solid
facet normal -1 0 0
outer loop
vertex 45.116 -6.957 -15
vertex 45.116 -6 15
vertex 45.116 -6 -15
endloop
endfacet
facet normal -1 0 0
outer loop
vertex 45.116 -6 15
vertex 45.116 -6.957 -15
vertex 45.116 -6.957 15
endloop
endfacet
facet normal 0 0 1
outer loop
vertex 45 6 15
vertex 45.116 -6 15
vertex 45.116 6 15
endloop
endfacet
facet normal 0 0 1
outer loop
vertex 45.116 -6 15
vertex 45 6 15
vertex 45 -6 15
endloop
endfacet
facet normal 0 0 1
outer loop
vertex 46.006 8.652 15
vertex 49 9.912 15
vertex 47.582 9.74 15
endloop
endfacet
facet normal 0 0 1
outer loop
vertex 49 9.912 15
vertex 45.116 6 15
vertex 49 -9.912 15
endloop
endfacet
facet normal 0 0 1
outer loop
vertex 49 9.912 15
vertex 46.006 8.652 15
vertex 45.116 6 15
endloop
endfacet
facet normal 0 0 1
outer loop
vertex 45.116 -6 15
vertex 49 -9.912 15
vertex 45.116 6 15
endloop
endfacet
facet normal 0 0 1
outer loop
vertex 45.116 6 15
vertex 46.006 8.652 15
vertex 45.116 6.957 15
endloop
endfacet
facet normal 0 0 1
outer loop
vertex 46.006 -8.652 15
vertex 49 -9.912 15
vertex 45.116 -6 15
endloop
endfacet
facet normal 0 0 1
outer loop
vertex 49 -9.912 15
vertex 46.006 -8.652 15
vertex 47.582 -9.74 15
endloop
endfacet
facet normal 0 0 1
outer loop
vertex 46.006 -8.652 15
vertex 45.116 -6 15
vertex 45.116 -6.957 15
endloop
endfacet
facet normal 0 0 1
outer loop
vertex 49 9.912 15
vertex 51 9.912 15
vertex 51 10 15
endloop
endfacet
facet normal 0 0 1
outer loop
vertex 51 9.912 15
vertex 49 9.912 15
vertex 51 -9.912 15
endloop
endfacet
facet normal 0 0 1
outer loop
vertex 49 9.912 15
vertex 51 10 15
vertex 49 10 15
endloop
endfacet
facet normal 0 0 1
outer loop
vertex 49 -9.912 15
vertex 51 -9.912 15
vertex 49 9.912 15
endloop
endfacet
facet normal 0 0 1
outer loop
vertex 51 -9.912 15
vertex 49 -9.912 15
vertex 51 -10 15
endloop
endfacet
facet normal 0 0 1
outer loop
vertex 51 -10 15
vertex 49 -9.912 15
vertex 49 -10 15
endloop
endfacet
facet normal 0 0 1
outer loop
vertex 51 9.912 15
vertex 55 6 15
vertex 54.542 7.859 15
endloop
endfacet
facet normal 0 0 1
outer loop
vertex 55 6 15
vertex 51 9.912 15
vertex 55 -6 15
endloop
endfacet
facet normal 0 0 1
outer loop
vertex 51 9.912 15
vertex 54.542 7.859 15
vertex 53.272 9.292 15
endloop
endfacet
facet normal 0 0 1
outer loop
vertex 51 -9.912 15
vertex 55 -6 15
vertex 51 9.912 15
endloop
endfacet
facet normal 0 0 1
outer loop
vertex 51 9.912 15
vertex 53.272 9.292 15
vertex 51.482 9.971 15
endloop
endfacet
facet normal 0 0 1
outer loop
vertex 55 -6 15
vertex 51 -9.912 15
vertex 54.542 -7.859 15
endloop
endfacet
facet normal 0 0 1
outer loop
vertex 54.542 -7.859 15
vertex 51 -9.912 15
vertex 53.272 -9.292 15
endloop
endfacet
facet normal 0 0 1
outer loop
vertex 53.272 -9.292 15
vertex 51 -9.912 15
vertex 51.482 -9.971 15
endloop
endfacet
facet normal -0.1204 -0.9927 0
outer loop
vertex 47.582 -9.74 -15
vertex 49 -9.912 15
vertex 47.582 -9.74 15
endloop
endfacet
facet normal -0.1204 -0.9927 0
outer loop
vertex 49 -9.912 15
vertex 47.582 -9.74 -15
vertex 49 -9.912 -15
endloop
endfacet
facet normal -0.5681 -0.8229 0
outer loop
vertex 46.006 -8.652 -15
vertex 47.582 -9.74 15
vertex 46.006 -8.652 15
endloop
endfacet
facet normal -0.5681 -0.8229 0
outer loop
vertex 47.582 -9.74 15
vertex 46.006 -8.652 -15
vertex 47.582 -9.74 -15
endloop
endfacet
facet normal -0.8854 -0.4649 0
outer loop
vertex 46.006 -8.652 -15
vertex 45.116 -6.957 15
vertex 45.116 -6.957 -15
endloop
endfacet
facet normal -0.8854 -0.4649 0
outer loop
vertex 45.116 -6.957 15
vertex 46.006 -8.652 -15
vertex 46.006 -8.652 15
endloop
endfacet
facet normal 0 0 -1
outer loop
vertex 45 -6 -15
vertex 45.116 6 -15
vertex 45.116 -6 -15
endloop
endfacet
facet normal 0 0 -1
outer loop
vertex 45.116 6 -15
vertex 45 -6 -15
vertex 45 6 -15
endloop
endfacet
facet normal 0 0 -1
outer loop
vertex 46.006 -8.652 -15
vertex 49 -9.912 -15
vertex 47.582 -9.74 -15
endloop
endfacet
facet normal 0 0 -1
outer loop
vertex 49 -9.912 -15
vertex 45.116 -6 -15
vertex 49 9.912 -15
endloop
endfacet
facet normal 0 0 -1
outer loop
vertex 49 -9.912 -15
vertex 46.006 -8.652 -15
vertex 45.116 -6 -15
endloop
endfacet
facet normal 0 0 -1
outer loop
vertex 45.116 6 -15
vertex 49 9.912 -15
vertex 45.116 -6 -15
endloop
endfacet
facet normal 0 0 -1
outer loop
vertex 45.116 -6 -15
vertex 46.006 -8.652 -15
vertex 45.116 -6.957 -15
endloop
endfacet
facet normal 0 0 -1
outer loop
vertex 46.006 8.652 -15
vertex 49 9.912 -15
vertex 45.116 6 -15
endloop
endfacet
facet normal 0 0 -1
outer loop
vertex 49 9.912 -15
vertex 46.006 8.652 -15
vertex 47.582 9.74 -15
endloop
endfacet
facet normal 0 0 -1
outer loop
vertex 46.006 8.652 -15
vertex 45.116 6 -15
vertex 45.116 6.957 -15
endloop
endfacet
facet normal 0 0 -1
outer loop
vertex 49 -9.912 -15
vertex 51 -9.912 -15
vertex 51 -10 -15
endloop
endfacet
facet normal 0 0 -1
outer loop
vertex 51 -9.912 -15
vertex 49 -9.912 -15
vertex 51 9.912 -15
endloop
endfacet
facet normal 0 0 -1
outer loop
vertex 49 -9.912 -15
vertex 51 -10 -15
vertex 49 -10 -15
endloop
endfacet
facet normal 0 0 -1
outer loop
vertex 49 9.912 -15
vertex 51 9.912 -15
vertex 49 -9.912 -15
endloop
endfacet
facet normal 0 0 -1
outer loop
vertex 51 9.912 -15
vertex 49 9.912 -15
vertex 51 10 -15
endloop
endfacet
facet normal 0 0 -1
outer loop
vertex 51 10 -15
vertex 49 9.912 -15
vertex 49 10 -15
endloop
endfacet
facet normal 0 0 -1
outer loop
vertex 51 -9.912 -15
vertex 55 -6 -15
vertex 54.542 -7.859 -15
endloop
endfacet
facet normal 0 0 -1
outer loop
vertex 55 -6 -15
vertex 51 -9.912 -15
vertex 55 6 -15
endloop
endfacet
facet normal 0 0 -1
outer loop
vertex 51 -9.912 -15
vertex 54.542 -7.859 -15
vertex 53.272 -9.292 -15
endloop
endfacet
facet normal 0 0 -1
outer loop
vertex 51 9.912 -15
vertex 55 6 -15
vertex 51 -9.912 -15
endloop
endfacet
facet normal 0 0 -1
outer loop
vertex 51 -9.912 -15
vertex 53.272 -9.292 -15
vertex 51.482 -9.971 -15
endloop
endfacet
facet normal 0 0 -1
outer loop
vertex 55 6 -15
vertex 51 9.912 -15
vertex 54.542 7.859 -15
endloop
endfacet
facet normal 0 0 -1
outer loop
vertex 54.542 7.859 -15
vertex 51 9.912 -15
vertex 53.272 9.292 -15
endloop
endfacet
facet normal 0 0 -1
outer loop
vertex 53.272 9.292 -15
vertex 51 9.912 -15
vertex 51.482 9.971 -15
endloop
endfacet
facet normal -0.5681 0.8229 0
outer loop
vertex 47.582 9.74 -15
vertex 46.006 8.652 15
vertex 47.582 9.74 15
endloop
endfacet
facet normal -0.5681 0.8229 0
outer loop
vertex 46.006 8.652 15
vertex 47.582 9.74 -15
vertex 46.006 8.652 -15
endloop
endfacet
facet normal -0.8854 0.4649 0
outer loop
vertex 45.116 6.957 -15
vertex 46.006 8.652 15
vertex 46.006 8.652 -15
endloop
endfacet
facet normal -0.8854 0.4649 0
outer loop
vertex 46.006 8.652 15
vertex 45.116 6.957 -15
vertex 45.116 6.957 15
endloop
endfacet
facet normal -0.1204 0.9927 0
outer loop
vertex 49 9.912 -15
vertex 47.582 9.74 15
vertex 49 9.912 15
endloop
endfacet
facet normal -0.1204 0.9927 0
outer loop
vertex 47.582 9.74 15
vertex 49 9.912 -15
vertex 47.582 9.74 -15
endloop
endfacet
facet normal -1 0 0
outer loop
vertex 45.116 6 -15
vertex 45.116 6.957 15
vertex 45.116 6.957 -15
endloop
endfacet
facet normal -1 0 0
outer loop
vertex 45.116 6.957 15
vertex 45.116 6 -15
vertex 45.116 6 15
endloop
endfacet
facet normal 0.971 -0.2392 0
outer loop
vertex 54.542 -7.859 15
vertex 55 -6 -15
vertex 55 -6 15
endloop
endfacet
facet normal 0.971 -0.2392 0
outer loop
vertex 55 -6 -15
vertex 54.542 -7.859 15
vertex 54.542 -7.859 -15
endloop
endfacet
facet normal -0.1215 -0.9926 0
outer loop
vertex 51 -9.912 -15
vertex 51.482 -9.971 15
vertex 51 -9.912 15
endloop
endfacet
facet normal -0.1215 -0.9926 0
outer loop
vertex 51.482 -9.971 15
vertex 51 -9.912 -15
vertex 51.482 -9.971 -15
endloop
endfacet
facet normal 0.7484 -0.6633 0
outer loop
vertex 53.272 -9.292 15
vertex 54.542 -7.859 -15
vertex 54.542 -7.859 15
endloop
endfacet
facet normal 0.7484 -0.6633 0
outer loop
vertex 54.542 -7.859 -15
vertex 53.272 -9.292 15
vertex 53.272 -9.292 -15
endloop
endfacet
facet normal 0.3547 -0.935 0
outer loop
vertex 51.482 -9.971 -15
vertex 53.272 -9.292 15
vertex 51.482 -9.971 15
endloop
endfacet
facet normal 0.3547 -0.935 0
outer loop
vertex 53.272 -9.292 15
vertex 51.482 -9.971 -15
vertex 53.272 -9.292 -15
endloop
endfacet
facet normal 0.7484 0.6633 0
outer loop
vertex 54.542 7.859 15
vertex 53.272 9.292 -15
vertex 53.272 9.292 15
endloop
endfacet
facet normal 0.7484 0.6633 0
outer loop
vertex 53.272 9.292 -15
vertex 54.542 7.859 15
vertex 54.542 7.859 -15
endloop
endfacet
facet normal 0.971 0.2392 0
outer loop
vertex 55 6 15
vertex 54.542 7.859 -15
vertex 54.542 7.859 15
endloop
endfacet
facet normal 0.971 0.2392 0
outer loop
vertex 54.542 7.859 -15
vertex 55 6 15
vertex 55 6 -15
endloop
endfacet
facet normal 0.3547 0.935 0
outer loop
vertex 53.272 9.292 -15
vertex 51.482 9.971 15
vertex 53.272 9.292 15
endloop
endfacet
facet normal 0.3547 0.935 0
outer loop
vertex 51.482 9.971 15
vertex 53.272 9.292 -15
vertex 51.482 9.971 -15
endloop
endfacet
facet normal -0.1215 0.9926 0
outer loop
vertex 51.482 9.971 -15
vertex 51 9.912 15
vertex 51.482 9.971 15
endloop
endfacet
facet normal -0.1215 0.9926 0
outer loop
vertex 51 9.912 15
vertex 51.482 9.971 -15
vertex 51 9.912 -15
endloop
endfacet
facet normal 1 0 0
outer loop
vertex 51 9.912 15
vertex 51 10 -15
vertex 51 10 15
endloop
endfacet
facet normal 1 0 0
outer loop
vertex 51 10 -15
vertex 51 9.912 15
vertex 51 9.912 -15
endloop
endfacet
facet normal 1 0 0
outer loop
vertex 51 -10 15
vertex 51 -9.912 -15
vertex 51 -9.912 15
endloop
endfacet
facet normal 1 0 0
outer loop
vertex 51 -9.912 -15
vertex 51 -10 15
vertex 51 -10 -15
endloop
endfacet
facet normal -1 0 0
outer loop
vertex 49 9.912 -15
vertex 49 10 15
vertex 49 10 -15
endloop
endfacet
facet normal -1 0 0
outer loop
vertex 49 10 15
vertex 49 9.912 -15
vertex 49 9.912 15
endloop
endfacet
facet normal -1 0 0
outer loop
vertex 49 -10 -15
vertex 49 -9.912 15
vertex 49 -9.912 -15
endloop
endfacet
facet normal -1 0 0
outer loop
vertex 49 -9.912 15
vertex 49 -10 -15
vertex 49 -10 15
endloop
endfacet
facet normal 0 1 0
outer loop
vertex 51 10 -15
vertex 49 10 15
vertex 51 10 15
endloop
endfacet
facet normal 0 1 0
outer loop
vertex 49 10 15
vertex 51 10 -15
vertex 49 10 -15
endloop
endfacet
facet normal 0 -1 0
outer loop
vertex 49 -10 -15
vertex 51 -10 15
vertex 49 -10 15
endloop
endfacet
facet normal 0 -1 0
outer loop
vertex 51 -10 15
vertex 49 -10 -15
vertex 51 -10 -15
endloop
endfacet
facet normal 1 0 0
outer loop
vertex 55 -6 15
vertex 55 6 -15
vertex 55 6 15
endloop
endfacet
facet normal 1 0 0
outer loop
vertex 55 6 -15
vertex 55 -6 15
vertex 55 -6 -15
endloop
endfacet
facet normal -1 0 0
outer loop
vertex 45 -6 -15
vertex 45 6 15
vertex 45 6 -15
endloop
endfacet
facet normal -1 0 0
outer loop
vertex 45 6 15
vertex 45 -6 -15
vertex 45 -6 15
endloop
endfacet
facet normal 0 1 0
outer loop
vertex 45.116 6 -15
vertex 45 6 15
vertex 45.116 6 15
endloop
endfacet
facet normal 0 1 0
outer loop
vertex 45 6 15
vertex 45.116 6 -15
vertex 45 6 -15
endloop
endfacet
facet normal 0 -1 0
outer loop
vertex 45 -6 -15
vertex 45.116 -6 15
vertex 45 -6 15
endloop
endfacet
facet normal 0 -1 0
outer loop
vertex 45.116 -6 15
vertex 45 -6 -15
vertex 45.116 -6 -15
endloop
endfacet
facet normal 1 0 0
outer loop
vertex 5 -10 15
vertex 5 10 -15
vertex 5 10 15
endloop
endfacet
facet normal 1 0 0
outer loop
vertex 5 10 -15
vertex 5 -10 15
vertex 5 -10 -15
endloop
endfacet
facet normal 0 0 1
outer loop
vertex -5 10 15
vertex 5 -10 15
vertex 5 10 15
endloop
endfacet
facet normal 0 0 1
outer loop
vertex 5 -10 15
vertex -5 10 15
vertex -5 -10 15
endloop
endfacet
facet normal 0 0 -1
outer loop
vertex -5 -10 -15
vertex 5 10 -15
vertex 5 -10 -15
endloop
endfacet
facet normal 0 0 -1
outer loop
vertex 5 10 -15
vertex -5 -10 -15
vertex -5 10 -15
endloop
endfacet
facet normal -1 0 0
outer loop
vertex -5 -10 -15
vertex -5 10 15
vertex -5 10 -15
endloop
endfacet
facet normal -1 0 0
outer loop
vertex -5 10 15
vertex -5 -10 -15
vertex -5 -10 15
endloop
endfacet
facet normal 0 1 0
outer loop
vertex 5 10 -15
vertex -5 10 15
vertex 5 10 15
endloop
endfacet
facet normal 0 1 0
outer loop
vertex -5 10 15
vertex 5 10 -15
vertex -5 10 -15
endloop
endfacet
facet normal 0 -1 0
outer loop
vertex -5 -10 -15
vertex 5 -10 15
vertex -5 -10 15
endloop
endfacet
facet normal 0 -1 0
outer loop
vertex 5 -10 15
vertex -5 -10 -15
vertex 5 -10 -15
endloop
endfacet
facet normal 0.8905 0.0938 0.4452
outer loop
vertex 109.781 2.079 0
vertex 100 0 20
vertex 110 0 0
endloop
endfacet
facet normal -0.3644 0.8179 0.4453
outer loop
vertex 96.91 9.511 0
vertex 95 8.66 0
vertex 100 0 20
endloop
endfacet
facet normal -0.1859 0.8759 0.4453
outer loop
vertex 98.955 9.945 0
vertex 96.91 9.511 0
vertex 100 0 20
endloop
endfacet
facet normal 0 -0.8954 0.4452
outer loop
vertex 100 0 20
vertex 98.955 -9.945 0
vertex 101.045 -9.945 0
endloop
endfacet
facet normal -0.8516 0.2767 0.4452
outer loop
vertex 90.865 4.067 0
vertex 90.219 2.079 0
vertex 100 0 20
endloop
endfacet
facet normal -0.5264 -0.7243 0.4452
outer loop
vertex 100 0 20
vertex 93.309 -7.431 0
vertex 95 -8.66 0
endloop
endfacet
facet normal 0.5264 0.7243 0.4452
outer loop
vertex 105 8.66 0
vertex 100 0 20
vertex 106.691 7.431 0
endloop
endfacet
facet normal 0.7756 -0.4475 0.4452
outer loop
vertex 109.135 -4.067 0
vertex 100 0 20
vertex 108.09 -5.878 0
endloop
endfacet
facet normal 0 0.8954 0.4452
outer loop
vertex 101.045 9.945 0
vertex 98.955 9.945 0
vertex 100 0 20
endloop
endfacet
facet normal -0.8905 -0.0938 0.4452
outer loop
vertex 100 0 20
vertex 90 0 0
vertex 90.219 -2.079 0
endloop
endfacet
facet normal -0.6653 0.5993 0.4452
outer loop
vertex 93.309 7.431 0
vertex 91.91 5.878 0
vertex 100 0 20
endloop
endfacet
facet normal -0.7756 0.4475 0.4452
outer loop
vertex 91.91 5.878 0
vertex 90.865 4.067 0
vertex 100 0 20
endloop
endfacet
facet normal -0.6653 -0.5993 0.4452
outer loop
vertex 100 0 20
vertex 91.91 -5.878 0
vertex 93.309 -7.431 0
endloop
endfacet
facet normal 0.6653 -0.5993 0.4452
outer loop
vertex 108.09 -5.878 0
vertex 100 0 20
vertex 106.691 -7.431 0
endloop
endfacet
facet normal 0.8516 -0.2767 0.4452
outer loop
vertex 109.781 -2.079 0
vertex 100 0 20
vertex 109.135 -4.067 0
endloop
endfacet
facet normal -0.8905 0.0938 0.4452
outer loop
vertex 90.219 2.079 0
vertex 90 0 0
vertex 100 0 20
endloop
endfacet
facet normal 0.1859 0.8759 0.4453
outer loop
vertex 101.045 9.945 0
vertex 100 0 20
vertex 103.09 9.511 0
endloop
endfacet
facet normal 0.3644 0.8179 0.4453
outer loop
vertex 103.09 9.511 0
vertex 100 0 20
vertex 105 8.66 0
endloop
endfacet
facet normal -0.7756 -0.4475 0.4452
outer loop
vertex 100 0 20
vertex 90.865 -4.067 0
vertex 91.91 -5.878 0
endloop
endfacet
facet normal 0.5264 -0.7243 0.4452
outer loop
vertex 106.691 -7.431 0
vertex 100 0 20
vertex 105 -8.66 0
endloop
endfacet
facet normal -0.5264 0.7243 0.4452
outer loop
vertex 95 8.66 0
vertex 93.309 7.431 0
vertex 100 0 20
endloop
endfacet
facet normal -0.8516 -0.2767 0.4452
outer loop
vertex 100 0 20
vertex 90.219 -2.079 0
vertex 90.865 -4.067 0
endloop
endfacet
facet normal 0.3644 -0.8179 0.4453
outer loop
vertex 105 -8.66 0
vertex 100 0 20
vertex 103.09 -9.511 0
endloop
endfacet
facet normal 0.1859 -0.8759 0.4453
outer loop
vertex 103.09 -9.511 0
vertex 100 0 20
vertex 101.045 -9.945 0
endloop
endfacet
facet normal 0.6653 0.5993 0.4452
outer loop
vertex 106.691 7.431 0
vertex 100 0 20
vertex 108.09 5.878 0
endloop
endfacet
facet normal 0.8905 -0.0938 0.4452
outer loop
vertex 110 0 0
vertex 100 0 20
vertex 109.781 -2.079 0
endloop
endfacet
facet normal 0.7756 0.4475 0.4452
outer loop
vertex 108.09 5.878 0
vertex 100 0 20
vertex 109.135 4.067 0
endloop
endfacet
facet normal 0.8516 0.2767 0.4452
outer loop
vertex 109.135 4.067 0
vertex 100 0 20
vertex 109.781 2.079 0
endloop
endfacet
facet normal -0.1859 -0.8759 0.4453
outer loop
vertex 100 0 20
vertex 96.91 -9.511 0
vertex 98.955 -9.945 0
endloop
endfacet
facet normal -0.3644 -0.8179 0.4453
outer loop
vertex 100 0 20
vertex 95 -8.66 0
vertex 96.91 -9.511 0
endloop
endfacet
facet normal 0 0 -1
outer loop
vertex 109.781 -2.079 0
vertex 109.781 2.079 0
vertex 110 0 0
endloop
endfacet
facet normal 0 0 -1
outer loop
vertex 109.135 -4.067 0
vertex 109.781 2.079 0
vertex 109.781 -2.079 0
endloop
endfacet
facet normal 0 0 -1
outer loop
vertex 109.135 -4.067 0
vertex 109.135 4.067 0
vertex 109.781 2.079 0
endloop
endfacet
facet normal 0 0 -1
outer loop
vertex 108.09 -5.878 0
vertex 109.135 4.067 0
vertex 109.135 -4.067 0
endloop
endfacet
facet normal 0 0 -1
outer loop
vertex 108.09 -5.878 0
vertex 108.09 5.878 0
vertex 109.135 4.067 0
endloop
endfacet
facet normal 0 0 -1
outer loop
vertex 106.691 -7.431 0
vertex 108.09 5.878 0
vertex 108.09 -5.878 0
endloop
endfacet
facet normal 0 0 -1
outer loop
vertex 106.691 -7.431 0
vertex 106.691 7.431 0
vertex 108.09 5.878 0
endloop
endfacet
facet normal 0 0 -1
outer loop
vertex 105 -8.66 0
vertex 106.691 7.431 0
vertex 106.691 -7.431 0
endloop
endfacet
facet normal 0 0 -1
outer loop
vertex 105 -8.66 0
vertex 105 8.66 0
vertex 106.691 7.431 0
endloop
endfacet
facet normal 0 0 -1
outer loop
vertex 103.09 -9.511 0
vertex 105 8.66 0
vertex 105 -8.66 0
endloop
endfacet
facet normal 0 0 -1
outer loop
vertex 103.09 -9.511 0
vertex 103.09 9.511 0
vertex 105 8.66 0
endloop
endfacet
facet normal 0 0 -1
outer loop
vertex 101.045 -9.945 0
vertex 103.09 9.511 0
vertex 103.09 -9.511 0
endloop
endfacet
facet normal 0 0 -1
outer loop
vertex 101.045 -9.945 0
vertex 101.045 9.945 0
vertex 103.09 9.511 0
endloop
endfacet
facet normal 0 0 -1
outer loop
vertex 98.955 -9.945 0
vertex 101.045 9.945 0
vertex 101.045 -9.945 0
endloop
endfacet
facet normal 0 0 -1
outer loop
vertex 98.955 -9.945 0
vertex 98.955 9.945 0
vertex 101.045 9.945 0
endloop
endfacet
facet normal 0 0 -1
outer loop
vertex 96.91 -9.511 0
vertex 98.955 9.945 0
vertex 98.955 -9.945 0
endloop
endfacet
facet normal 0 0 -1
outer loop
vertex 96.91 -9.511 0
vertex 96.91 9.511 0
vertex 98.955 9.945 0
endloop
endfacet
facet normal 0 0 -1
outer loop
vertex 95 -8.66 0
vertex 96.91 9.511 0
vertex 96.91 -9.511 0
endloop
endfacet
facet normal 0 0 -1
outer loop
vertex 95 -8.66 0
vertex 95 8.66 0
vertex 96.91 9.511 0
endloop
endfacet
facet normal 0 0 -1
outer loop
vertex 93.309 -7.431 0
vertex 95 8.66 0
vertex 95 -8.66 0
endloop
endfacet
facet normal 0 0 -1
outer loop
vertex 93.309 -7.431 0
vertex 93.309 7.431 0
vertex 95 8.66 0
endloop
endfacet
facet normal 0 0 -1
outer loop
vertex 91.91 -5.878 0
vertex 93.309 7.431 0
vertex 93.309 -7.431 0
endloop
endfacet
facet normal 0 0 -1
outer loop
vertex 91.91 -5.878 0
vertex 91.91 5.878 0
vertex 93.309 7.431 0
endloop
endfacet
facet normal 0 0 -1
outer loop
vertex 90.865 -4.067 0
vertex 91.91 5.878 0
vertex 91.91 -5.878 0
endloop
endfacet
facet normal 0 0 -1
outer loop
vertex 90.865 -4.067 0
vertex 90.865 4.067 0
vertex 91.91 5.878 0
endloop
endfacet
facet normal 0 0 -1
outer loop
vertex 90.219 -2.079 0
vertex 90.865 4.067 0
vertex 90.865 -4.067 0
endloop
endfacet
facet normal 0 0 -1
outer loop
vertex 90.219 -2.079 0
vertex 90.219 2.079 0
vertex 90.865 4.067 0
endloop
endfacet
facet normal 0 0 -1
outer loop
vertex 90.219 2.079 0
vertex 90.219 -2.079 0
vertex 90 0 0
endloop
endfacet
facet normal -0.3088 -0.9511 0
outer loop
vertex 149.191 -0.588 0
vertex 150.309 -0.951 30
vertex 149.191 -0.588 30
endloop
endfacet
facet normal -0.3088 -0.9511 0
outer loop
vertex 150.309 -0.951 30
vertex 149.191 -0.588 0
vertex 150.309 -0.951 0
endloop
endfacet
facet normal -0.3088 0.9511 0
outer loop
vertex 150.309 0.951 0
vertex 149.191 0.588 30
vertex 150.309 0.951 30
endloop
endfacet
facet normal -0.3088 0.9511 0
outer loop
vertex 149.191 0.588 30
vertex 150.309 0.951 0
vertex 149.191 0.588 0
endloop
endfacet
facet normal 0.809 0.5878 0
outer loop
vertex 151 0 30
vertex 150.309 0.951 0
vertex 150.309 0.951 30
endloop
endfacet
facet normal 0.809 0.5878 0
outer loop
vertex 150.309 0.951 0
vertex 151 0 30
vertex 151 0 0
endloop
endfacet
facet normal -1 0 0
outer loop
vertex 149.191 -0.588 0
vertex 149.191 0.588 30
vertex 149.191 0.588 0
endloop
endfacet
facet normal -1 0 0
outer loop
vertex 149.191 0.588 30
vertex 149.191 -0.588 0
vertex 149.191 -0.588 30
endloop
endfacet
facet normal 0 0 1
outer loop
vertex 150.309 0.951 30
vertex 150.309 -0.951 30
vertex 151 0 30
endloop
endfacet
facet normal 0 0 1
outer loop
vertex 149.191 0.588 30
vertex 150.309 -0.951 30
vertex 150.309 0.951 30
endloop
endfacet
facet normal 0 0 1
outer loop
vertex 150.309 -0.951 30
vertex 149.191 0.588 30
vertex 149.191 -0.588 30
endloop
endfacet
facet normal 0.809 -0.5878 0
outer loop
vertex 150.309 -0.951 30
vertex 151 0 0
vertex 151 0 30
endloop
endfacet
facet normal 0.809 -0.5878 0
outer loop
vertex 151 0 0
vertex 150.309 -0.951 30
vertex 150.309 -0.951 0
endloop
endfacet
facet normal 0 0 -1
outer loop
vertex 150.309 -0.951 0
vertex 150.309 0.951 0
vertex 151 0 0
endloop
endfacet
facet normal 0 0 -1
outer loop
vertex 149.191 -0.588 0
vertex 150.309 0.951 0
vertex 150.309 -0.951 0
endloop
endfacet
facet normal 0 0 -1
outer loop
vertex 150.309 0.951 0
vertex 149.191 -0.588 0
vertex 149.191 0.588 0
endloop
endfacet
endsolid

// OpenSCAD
use <MCAD/shapes.scad>

box(width = 10, height = 20, depth = 30);

translate([50, 0, 0]) roundedBox(width = 10, height = 20, depth = 30, radius = 4);

translate([100, 0, 0]) cone(height = 20, radius = 10);

translate([150, 0, 0])  ellipticalCylinder(width = 30, height= 30, depth = 40);

/*
heptagon(20);

translate([200, 0, 0]) ring(20, 10);

translate([250, 0, 0]) ellipse(20, 30);

translate([300, 0, 0]) egg_outline(20, 20 * 1.39);


translate([0,50, 0]) cone(height = 30, radius = 10, center = true)

translate([50,50, 0]) oval_prism(height = 40, rx = 15, ry = 10, center = false);

translate([100,50, 0]) oval_tube(height = 40, rx = 15, ry = 10, wall = 2, center = false);

translate([150,50, 0]) heptagon(20);

translate([200,50, 0]) ring(20, 10);

translate([250,50, 0]) ellipse(20, 30);

translate([300,50, 0]) egg_outline(20, 20 * 1.39);

*/
